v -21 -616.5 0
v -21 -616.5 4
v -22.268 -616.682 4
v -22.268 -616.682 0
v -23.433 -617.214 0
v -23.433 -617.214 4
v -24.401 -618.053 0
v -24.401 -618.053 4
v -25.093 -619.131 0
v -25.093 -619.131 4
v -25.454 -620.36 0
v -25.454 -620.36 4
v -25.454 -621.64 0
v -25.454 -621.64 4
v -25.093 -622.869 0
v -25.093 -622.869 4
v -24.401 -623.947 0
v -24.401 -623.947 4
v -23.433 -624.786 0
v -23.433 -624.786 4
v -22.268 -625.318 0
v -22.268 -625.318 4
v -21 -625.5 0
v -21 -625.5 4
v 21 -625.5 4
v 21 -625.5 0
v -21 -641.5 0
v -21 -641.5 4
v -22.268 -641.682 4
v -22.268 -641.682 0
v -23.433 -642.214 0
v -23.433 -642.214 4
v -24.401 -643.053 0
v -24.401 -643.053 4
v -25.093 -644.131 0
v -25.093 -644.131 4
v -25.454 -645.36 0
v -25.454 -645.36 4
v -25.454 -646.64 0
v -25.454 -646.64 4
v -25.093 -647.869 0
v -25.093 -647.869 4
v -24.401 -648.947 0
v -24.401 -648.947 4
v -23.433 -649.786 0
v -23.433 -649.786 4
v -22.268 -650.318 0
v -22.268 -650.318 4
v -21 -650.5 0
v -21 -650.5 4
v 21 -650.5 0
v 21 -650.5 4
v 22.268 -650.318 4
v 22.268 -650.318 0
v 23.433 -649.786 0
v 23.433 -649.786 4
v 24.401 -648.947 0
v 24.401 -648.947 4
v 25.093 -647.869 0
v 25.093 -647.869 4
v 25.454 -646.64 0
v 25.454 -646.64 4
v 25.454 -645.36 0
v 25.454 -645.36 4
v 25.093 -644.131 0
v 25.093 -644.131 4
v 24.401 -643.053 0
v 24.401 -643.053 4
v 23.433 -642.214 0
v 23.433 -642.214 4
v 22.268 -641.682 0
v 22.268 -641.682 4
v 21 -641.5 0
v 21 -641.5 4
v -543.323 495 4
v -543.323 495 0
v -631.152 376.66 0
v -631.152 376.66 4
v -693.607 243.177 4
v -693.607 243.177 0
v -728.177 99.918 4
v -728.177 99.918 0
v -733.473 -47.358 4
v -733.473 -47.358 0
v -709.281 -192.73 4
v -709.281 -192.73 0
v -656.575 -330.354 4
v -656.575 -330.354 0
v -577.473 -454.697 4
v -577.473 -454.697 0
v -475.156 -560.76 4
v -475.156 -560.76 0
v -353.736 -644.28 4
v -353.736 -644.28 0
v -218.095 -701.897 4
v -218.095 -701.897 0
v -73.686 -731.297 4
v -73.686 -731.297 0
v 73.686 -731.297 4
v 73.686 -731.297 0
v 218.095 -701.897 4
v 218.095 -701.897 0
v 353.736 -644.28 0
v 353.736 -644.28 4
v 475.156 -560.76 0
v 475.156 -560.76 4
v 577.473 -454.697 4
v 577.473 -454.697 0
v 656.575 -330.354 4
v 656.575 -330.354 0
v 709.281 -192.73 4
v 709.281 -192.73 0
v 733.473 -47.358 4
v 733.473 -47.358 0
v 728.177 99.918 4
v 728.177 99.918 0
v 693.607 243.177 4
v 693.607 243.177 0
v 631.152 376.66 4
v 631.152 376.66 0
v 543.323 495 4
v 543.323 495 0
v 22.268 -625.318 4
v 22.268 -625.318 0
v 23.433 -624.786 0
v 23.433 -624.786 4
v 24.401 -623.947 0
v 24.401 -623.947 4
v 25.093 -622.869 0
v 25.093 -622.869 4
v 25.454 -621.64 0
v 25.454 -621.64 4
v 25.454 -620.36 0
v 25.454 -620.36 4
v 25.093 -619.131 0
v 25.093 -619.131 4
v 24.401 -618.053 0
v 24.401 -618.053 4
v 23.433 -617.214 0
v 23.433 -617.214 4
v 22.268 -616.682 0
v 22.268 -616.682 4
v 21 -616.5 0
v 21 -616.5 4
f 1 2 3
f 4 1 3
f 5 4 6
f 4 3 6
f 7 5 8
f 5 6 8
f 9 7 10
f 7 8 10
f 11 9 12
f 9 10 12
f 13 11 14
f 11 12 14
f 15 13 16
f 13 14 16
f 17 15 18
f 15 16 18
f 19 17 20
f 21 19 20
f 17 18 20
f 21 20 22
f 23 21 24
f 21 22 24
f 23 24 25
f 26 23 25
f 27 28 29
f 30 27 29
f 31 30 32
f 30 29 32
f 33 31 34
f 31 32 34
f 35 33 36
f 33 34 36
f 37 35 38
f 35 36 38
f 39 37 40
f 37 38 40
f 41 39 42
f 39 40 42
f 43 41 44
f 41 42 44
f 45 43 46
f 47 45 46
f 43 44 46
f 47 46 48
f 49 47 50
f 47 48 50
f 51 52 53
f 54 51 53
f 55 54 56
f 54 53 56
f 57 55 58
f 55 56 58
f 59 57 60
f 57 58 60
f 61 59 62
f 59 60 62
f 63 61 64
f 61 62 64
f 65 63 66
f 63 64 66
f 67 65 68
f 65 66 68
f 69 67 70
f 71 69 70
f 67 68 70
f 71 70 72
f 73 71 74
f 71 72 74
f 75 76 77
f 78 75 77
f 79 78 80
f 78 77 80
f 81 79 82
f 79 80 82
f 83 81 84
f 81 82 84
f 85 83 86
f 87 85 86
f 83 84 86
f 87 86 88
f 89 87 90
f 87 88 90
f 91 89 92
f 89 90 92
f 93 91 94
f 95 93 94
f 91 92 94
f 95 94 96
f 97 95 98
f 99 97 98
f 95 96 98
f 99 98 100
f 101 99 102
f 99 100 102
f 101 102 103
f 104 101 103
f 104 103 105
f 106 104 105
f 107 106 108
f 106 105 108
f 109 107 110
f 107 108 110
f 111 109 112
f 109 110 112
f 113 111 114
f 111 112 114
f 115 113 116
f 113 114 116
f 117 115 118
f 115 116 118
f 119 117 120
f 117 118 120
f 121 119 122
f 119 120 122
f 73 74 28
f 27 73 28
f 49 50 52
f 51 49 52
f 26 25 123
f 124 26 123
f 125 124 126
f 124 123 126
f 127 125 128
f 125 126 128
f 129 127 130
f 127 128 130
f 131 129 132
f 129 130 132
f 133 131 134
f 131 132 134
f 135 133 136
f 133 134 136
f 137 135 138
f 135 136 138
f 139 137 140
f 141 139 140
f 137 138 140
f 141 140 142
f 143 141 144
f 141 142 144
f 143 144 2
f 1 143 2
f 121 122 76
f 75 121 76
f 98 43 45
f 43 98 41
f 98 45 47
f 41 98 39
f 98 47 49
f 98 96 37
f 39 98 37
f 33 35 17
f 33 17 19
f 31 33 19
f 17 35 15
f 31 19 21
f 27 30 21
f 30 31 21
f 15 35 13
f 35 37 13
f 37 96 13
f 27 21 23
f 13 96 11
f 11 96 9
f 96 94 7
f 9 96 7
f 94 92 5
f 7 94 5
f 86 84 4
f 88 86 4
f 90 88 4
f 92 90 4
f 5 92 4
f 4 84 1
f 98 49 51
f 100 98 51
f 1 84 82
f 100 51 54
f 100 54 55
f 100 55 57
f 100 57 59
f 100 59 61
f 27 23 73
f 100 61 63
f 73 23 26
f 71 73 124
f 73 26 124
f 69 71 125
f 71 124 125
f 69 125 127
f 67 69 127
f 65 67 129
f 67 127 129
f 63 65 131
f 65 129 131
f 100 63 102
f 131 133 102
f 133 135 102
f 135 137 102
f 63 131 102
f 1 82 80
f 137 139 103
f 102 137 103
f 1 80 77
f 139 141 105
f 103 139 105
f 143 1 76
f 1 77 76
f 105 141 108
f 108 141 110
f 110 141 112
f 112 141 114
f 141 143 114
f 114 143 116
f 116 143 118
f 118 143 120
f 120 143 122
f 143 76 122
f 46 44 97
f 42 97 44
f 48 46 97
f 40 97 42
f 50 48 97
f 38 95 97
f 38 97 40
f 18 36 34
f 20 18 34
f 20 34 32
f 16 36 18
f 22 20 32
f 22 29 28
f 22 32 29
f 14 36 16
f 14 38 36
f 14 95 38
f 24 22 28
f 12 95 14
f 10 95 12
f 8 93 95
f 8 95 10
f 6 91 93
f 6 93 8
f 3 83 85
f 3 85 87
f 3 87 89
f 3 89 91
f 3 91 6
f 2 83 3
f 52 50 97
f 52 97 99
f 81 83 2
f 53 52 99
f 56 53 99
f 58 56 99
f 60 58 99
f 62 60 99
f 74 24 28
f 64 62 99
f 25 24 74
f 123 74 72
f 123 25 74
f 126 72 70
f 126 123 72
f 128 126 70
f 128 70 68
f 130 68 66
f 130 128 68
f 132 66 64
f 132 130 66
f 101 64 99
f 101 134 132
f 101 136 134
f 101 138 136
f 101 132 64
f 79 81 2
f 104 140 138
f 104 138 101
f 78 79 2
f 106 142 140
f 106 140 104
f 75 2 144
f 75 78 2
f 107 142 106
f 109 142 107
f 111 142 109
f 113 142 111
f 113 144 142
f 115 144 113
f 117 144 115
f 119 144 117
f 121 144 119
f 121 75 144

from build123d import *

# Parameters (mm, degrees)
F1_DEPTH = 4
F3_DEPTH = 25


with BuildPart() as f1:
    # F0 (on Top) → F1 (new body)
    with BuildSketch(Plane.XY):
        with BuildLine():
            Line((543.323108, 495), (-543.323108, 495))
            ThreePointArc((-543.323108, 495), (0, -735), (543.323108, 495))
        make_face()
    extrude(amount=F1_DEPTH)

    # F2 (on face) → F3 (cut)
    with BuildSketch(Plane.XY.offset(4)):
        with BuildLine():
            Line((21, -616.5), (-21, -616.5))
            ThreePointArc((-21, -616.5), (-25.5, -621), (-21, -625.5))
            Line((-21, -625.5), (21, -625.5))
            ThreePointArc((21, -625.5), (25.5, -621), (21, -616.5))
        make_face()
        with BuildLine():
            Line((21, -641.5), (-21, -641.5))
            ThreePointArc((-21, -641.5), (-25.5, -646), (-21, -650.5))
            Line((-21, -650.5), (21, -650.5))
            ThreePointArc((21, -650.5), (25.5, -646), (21, -641.5))
        make_face()
    extrude(amount=-F3_DEPTH, mode=Mode.SUBTRACT)


solid = f1.part
